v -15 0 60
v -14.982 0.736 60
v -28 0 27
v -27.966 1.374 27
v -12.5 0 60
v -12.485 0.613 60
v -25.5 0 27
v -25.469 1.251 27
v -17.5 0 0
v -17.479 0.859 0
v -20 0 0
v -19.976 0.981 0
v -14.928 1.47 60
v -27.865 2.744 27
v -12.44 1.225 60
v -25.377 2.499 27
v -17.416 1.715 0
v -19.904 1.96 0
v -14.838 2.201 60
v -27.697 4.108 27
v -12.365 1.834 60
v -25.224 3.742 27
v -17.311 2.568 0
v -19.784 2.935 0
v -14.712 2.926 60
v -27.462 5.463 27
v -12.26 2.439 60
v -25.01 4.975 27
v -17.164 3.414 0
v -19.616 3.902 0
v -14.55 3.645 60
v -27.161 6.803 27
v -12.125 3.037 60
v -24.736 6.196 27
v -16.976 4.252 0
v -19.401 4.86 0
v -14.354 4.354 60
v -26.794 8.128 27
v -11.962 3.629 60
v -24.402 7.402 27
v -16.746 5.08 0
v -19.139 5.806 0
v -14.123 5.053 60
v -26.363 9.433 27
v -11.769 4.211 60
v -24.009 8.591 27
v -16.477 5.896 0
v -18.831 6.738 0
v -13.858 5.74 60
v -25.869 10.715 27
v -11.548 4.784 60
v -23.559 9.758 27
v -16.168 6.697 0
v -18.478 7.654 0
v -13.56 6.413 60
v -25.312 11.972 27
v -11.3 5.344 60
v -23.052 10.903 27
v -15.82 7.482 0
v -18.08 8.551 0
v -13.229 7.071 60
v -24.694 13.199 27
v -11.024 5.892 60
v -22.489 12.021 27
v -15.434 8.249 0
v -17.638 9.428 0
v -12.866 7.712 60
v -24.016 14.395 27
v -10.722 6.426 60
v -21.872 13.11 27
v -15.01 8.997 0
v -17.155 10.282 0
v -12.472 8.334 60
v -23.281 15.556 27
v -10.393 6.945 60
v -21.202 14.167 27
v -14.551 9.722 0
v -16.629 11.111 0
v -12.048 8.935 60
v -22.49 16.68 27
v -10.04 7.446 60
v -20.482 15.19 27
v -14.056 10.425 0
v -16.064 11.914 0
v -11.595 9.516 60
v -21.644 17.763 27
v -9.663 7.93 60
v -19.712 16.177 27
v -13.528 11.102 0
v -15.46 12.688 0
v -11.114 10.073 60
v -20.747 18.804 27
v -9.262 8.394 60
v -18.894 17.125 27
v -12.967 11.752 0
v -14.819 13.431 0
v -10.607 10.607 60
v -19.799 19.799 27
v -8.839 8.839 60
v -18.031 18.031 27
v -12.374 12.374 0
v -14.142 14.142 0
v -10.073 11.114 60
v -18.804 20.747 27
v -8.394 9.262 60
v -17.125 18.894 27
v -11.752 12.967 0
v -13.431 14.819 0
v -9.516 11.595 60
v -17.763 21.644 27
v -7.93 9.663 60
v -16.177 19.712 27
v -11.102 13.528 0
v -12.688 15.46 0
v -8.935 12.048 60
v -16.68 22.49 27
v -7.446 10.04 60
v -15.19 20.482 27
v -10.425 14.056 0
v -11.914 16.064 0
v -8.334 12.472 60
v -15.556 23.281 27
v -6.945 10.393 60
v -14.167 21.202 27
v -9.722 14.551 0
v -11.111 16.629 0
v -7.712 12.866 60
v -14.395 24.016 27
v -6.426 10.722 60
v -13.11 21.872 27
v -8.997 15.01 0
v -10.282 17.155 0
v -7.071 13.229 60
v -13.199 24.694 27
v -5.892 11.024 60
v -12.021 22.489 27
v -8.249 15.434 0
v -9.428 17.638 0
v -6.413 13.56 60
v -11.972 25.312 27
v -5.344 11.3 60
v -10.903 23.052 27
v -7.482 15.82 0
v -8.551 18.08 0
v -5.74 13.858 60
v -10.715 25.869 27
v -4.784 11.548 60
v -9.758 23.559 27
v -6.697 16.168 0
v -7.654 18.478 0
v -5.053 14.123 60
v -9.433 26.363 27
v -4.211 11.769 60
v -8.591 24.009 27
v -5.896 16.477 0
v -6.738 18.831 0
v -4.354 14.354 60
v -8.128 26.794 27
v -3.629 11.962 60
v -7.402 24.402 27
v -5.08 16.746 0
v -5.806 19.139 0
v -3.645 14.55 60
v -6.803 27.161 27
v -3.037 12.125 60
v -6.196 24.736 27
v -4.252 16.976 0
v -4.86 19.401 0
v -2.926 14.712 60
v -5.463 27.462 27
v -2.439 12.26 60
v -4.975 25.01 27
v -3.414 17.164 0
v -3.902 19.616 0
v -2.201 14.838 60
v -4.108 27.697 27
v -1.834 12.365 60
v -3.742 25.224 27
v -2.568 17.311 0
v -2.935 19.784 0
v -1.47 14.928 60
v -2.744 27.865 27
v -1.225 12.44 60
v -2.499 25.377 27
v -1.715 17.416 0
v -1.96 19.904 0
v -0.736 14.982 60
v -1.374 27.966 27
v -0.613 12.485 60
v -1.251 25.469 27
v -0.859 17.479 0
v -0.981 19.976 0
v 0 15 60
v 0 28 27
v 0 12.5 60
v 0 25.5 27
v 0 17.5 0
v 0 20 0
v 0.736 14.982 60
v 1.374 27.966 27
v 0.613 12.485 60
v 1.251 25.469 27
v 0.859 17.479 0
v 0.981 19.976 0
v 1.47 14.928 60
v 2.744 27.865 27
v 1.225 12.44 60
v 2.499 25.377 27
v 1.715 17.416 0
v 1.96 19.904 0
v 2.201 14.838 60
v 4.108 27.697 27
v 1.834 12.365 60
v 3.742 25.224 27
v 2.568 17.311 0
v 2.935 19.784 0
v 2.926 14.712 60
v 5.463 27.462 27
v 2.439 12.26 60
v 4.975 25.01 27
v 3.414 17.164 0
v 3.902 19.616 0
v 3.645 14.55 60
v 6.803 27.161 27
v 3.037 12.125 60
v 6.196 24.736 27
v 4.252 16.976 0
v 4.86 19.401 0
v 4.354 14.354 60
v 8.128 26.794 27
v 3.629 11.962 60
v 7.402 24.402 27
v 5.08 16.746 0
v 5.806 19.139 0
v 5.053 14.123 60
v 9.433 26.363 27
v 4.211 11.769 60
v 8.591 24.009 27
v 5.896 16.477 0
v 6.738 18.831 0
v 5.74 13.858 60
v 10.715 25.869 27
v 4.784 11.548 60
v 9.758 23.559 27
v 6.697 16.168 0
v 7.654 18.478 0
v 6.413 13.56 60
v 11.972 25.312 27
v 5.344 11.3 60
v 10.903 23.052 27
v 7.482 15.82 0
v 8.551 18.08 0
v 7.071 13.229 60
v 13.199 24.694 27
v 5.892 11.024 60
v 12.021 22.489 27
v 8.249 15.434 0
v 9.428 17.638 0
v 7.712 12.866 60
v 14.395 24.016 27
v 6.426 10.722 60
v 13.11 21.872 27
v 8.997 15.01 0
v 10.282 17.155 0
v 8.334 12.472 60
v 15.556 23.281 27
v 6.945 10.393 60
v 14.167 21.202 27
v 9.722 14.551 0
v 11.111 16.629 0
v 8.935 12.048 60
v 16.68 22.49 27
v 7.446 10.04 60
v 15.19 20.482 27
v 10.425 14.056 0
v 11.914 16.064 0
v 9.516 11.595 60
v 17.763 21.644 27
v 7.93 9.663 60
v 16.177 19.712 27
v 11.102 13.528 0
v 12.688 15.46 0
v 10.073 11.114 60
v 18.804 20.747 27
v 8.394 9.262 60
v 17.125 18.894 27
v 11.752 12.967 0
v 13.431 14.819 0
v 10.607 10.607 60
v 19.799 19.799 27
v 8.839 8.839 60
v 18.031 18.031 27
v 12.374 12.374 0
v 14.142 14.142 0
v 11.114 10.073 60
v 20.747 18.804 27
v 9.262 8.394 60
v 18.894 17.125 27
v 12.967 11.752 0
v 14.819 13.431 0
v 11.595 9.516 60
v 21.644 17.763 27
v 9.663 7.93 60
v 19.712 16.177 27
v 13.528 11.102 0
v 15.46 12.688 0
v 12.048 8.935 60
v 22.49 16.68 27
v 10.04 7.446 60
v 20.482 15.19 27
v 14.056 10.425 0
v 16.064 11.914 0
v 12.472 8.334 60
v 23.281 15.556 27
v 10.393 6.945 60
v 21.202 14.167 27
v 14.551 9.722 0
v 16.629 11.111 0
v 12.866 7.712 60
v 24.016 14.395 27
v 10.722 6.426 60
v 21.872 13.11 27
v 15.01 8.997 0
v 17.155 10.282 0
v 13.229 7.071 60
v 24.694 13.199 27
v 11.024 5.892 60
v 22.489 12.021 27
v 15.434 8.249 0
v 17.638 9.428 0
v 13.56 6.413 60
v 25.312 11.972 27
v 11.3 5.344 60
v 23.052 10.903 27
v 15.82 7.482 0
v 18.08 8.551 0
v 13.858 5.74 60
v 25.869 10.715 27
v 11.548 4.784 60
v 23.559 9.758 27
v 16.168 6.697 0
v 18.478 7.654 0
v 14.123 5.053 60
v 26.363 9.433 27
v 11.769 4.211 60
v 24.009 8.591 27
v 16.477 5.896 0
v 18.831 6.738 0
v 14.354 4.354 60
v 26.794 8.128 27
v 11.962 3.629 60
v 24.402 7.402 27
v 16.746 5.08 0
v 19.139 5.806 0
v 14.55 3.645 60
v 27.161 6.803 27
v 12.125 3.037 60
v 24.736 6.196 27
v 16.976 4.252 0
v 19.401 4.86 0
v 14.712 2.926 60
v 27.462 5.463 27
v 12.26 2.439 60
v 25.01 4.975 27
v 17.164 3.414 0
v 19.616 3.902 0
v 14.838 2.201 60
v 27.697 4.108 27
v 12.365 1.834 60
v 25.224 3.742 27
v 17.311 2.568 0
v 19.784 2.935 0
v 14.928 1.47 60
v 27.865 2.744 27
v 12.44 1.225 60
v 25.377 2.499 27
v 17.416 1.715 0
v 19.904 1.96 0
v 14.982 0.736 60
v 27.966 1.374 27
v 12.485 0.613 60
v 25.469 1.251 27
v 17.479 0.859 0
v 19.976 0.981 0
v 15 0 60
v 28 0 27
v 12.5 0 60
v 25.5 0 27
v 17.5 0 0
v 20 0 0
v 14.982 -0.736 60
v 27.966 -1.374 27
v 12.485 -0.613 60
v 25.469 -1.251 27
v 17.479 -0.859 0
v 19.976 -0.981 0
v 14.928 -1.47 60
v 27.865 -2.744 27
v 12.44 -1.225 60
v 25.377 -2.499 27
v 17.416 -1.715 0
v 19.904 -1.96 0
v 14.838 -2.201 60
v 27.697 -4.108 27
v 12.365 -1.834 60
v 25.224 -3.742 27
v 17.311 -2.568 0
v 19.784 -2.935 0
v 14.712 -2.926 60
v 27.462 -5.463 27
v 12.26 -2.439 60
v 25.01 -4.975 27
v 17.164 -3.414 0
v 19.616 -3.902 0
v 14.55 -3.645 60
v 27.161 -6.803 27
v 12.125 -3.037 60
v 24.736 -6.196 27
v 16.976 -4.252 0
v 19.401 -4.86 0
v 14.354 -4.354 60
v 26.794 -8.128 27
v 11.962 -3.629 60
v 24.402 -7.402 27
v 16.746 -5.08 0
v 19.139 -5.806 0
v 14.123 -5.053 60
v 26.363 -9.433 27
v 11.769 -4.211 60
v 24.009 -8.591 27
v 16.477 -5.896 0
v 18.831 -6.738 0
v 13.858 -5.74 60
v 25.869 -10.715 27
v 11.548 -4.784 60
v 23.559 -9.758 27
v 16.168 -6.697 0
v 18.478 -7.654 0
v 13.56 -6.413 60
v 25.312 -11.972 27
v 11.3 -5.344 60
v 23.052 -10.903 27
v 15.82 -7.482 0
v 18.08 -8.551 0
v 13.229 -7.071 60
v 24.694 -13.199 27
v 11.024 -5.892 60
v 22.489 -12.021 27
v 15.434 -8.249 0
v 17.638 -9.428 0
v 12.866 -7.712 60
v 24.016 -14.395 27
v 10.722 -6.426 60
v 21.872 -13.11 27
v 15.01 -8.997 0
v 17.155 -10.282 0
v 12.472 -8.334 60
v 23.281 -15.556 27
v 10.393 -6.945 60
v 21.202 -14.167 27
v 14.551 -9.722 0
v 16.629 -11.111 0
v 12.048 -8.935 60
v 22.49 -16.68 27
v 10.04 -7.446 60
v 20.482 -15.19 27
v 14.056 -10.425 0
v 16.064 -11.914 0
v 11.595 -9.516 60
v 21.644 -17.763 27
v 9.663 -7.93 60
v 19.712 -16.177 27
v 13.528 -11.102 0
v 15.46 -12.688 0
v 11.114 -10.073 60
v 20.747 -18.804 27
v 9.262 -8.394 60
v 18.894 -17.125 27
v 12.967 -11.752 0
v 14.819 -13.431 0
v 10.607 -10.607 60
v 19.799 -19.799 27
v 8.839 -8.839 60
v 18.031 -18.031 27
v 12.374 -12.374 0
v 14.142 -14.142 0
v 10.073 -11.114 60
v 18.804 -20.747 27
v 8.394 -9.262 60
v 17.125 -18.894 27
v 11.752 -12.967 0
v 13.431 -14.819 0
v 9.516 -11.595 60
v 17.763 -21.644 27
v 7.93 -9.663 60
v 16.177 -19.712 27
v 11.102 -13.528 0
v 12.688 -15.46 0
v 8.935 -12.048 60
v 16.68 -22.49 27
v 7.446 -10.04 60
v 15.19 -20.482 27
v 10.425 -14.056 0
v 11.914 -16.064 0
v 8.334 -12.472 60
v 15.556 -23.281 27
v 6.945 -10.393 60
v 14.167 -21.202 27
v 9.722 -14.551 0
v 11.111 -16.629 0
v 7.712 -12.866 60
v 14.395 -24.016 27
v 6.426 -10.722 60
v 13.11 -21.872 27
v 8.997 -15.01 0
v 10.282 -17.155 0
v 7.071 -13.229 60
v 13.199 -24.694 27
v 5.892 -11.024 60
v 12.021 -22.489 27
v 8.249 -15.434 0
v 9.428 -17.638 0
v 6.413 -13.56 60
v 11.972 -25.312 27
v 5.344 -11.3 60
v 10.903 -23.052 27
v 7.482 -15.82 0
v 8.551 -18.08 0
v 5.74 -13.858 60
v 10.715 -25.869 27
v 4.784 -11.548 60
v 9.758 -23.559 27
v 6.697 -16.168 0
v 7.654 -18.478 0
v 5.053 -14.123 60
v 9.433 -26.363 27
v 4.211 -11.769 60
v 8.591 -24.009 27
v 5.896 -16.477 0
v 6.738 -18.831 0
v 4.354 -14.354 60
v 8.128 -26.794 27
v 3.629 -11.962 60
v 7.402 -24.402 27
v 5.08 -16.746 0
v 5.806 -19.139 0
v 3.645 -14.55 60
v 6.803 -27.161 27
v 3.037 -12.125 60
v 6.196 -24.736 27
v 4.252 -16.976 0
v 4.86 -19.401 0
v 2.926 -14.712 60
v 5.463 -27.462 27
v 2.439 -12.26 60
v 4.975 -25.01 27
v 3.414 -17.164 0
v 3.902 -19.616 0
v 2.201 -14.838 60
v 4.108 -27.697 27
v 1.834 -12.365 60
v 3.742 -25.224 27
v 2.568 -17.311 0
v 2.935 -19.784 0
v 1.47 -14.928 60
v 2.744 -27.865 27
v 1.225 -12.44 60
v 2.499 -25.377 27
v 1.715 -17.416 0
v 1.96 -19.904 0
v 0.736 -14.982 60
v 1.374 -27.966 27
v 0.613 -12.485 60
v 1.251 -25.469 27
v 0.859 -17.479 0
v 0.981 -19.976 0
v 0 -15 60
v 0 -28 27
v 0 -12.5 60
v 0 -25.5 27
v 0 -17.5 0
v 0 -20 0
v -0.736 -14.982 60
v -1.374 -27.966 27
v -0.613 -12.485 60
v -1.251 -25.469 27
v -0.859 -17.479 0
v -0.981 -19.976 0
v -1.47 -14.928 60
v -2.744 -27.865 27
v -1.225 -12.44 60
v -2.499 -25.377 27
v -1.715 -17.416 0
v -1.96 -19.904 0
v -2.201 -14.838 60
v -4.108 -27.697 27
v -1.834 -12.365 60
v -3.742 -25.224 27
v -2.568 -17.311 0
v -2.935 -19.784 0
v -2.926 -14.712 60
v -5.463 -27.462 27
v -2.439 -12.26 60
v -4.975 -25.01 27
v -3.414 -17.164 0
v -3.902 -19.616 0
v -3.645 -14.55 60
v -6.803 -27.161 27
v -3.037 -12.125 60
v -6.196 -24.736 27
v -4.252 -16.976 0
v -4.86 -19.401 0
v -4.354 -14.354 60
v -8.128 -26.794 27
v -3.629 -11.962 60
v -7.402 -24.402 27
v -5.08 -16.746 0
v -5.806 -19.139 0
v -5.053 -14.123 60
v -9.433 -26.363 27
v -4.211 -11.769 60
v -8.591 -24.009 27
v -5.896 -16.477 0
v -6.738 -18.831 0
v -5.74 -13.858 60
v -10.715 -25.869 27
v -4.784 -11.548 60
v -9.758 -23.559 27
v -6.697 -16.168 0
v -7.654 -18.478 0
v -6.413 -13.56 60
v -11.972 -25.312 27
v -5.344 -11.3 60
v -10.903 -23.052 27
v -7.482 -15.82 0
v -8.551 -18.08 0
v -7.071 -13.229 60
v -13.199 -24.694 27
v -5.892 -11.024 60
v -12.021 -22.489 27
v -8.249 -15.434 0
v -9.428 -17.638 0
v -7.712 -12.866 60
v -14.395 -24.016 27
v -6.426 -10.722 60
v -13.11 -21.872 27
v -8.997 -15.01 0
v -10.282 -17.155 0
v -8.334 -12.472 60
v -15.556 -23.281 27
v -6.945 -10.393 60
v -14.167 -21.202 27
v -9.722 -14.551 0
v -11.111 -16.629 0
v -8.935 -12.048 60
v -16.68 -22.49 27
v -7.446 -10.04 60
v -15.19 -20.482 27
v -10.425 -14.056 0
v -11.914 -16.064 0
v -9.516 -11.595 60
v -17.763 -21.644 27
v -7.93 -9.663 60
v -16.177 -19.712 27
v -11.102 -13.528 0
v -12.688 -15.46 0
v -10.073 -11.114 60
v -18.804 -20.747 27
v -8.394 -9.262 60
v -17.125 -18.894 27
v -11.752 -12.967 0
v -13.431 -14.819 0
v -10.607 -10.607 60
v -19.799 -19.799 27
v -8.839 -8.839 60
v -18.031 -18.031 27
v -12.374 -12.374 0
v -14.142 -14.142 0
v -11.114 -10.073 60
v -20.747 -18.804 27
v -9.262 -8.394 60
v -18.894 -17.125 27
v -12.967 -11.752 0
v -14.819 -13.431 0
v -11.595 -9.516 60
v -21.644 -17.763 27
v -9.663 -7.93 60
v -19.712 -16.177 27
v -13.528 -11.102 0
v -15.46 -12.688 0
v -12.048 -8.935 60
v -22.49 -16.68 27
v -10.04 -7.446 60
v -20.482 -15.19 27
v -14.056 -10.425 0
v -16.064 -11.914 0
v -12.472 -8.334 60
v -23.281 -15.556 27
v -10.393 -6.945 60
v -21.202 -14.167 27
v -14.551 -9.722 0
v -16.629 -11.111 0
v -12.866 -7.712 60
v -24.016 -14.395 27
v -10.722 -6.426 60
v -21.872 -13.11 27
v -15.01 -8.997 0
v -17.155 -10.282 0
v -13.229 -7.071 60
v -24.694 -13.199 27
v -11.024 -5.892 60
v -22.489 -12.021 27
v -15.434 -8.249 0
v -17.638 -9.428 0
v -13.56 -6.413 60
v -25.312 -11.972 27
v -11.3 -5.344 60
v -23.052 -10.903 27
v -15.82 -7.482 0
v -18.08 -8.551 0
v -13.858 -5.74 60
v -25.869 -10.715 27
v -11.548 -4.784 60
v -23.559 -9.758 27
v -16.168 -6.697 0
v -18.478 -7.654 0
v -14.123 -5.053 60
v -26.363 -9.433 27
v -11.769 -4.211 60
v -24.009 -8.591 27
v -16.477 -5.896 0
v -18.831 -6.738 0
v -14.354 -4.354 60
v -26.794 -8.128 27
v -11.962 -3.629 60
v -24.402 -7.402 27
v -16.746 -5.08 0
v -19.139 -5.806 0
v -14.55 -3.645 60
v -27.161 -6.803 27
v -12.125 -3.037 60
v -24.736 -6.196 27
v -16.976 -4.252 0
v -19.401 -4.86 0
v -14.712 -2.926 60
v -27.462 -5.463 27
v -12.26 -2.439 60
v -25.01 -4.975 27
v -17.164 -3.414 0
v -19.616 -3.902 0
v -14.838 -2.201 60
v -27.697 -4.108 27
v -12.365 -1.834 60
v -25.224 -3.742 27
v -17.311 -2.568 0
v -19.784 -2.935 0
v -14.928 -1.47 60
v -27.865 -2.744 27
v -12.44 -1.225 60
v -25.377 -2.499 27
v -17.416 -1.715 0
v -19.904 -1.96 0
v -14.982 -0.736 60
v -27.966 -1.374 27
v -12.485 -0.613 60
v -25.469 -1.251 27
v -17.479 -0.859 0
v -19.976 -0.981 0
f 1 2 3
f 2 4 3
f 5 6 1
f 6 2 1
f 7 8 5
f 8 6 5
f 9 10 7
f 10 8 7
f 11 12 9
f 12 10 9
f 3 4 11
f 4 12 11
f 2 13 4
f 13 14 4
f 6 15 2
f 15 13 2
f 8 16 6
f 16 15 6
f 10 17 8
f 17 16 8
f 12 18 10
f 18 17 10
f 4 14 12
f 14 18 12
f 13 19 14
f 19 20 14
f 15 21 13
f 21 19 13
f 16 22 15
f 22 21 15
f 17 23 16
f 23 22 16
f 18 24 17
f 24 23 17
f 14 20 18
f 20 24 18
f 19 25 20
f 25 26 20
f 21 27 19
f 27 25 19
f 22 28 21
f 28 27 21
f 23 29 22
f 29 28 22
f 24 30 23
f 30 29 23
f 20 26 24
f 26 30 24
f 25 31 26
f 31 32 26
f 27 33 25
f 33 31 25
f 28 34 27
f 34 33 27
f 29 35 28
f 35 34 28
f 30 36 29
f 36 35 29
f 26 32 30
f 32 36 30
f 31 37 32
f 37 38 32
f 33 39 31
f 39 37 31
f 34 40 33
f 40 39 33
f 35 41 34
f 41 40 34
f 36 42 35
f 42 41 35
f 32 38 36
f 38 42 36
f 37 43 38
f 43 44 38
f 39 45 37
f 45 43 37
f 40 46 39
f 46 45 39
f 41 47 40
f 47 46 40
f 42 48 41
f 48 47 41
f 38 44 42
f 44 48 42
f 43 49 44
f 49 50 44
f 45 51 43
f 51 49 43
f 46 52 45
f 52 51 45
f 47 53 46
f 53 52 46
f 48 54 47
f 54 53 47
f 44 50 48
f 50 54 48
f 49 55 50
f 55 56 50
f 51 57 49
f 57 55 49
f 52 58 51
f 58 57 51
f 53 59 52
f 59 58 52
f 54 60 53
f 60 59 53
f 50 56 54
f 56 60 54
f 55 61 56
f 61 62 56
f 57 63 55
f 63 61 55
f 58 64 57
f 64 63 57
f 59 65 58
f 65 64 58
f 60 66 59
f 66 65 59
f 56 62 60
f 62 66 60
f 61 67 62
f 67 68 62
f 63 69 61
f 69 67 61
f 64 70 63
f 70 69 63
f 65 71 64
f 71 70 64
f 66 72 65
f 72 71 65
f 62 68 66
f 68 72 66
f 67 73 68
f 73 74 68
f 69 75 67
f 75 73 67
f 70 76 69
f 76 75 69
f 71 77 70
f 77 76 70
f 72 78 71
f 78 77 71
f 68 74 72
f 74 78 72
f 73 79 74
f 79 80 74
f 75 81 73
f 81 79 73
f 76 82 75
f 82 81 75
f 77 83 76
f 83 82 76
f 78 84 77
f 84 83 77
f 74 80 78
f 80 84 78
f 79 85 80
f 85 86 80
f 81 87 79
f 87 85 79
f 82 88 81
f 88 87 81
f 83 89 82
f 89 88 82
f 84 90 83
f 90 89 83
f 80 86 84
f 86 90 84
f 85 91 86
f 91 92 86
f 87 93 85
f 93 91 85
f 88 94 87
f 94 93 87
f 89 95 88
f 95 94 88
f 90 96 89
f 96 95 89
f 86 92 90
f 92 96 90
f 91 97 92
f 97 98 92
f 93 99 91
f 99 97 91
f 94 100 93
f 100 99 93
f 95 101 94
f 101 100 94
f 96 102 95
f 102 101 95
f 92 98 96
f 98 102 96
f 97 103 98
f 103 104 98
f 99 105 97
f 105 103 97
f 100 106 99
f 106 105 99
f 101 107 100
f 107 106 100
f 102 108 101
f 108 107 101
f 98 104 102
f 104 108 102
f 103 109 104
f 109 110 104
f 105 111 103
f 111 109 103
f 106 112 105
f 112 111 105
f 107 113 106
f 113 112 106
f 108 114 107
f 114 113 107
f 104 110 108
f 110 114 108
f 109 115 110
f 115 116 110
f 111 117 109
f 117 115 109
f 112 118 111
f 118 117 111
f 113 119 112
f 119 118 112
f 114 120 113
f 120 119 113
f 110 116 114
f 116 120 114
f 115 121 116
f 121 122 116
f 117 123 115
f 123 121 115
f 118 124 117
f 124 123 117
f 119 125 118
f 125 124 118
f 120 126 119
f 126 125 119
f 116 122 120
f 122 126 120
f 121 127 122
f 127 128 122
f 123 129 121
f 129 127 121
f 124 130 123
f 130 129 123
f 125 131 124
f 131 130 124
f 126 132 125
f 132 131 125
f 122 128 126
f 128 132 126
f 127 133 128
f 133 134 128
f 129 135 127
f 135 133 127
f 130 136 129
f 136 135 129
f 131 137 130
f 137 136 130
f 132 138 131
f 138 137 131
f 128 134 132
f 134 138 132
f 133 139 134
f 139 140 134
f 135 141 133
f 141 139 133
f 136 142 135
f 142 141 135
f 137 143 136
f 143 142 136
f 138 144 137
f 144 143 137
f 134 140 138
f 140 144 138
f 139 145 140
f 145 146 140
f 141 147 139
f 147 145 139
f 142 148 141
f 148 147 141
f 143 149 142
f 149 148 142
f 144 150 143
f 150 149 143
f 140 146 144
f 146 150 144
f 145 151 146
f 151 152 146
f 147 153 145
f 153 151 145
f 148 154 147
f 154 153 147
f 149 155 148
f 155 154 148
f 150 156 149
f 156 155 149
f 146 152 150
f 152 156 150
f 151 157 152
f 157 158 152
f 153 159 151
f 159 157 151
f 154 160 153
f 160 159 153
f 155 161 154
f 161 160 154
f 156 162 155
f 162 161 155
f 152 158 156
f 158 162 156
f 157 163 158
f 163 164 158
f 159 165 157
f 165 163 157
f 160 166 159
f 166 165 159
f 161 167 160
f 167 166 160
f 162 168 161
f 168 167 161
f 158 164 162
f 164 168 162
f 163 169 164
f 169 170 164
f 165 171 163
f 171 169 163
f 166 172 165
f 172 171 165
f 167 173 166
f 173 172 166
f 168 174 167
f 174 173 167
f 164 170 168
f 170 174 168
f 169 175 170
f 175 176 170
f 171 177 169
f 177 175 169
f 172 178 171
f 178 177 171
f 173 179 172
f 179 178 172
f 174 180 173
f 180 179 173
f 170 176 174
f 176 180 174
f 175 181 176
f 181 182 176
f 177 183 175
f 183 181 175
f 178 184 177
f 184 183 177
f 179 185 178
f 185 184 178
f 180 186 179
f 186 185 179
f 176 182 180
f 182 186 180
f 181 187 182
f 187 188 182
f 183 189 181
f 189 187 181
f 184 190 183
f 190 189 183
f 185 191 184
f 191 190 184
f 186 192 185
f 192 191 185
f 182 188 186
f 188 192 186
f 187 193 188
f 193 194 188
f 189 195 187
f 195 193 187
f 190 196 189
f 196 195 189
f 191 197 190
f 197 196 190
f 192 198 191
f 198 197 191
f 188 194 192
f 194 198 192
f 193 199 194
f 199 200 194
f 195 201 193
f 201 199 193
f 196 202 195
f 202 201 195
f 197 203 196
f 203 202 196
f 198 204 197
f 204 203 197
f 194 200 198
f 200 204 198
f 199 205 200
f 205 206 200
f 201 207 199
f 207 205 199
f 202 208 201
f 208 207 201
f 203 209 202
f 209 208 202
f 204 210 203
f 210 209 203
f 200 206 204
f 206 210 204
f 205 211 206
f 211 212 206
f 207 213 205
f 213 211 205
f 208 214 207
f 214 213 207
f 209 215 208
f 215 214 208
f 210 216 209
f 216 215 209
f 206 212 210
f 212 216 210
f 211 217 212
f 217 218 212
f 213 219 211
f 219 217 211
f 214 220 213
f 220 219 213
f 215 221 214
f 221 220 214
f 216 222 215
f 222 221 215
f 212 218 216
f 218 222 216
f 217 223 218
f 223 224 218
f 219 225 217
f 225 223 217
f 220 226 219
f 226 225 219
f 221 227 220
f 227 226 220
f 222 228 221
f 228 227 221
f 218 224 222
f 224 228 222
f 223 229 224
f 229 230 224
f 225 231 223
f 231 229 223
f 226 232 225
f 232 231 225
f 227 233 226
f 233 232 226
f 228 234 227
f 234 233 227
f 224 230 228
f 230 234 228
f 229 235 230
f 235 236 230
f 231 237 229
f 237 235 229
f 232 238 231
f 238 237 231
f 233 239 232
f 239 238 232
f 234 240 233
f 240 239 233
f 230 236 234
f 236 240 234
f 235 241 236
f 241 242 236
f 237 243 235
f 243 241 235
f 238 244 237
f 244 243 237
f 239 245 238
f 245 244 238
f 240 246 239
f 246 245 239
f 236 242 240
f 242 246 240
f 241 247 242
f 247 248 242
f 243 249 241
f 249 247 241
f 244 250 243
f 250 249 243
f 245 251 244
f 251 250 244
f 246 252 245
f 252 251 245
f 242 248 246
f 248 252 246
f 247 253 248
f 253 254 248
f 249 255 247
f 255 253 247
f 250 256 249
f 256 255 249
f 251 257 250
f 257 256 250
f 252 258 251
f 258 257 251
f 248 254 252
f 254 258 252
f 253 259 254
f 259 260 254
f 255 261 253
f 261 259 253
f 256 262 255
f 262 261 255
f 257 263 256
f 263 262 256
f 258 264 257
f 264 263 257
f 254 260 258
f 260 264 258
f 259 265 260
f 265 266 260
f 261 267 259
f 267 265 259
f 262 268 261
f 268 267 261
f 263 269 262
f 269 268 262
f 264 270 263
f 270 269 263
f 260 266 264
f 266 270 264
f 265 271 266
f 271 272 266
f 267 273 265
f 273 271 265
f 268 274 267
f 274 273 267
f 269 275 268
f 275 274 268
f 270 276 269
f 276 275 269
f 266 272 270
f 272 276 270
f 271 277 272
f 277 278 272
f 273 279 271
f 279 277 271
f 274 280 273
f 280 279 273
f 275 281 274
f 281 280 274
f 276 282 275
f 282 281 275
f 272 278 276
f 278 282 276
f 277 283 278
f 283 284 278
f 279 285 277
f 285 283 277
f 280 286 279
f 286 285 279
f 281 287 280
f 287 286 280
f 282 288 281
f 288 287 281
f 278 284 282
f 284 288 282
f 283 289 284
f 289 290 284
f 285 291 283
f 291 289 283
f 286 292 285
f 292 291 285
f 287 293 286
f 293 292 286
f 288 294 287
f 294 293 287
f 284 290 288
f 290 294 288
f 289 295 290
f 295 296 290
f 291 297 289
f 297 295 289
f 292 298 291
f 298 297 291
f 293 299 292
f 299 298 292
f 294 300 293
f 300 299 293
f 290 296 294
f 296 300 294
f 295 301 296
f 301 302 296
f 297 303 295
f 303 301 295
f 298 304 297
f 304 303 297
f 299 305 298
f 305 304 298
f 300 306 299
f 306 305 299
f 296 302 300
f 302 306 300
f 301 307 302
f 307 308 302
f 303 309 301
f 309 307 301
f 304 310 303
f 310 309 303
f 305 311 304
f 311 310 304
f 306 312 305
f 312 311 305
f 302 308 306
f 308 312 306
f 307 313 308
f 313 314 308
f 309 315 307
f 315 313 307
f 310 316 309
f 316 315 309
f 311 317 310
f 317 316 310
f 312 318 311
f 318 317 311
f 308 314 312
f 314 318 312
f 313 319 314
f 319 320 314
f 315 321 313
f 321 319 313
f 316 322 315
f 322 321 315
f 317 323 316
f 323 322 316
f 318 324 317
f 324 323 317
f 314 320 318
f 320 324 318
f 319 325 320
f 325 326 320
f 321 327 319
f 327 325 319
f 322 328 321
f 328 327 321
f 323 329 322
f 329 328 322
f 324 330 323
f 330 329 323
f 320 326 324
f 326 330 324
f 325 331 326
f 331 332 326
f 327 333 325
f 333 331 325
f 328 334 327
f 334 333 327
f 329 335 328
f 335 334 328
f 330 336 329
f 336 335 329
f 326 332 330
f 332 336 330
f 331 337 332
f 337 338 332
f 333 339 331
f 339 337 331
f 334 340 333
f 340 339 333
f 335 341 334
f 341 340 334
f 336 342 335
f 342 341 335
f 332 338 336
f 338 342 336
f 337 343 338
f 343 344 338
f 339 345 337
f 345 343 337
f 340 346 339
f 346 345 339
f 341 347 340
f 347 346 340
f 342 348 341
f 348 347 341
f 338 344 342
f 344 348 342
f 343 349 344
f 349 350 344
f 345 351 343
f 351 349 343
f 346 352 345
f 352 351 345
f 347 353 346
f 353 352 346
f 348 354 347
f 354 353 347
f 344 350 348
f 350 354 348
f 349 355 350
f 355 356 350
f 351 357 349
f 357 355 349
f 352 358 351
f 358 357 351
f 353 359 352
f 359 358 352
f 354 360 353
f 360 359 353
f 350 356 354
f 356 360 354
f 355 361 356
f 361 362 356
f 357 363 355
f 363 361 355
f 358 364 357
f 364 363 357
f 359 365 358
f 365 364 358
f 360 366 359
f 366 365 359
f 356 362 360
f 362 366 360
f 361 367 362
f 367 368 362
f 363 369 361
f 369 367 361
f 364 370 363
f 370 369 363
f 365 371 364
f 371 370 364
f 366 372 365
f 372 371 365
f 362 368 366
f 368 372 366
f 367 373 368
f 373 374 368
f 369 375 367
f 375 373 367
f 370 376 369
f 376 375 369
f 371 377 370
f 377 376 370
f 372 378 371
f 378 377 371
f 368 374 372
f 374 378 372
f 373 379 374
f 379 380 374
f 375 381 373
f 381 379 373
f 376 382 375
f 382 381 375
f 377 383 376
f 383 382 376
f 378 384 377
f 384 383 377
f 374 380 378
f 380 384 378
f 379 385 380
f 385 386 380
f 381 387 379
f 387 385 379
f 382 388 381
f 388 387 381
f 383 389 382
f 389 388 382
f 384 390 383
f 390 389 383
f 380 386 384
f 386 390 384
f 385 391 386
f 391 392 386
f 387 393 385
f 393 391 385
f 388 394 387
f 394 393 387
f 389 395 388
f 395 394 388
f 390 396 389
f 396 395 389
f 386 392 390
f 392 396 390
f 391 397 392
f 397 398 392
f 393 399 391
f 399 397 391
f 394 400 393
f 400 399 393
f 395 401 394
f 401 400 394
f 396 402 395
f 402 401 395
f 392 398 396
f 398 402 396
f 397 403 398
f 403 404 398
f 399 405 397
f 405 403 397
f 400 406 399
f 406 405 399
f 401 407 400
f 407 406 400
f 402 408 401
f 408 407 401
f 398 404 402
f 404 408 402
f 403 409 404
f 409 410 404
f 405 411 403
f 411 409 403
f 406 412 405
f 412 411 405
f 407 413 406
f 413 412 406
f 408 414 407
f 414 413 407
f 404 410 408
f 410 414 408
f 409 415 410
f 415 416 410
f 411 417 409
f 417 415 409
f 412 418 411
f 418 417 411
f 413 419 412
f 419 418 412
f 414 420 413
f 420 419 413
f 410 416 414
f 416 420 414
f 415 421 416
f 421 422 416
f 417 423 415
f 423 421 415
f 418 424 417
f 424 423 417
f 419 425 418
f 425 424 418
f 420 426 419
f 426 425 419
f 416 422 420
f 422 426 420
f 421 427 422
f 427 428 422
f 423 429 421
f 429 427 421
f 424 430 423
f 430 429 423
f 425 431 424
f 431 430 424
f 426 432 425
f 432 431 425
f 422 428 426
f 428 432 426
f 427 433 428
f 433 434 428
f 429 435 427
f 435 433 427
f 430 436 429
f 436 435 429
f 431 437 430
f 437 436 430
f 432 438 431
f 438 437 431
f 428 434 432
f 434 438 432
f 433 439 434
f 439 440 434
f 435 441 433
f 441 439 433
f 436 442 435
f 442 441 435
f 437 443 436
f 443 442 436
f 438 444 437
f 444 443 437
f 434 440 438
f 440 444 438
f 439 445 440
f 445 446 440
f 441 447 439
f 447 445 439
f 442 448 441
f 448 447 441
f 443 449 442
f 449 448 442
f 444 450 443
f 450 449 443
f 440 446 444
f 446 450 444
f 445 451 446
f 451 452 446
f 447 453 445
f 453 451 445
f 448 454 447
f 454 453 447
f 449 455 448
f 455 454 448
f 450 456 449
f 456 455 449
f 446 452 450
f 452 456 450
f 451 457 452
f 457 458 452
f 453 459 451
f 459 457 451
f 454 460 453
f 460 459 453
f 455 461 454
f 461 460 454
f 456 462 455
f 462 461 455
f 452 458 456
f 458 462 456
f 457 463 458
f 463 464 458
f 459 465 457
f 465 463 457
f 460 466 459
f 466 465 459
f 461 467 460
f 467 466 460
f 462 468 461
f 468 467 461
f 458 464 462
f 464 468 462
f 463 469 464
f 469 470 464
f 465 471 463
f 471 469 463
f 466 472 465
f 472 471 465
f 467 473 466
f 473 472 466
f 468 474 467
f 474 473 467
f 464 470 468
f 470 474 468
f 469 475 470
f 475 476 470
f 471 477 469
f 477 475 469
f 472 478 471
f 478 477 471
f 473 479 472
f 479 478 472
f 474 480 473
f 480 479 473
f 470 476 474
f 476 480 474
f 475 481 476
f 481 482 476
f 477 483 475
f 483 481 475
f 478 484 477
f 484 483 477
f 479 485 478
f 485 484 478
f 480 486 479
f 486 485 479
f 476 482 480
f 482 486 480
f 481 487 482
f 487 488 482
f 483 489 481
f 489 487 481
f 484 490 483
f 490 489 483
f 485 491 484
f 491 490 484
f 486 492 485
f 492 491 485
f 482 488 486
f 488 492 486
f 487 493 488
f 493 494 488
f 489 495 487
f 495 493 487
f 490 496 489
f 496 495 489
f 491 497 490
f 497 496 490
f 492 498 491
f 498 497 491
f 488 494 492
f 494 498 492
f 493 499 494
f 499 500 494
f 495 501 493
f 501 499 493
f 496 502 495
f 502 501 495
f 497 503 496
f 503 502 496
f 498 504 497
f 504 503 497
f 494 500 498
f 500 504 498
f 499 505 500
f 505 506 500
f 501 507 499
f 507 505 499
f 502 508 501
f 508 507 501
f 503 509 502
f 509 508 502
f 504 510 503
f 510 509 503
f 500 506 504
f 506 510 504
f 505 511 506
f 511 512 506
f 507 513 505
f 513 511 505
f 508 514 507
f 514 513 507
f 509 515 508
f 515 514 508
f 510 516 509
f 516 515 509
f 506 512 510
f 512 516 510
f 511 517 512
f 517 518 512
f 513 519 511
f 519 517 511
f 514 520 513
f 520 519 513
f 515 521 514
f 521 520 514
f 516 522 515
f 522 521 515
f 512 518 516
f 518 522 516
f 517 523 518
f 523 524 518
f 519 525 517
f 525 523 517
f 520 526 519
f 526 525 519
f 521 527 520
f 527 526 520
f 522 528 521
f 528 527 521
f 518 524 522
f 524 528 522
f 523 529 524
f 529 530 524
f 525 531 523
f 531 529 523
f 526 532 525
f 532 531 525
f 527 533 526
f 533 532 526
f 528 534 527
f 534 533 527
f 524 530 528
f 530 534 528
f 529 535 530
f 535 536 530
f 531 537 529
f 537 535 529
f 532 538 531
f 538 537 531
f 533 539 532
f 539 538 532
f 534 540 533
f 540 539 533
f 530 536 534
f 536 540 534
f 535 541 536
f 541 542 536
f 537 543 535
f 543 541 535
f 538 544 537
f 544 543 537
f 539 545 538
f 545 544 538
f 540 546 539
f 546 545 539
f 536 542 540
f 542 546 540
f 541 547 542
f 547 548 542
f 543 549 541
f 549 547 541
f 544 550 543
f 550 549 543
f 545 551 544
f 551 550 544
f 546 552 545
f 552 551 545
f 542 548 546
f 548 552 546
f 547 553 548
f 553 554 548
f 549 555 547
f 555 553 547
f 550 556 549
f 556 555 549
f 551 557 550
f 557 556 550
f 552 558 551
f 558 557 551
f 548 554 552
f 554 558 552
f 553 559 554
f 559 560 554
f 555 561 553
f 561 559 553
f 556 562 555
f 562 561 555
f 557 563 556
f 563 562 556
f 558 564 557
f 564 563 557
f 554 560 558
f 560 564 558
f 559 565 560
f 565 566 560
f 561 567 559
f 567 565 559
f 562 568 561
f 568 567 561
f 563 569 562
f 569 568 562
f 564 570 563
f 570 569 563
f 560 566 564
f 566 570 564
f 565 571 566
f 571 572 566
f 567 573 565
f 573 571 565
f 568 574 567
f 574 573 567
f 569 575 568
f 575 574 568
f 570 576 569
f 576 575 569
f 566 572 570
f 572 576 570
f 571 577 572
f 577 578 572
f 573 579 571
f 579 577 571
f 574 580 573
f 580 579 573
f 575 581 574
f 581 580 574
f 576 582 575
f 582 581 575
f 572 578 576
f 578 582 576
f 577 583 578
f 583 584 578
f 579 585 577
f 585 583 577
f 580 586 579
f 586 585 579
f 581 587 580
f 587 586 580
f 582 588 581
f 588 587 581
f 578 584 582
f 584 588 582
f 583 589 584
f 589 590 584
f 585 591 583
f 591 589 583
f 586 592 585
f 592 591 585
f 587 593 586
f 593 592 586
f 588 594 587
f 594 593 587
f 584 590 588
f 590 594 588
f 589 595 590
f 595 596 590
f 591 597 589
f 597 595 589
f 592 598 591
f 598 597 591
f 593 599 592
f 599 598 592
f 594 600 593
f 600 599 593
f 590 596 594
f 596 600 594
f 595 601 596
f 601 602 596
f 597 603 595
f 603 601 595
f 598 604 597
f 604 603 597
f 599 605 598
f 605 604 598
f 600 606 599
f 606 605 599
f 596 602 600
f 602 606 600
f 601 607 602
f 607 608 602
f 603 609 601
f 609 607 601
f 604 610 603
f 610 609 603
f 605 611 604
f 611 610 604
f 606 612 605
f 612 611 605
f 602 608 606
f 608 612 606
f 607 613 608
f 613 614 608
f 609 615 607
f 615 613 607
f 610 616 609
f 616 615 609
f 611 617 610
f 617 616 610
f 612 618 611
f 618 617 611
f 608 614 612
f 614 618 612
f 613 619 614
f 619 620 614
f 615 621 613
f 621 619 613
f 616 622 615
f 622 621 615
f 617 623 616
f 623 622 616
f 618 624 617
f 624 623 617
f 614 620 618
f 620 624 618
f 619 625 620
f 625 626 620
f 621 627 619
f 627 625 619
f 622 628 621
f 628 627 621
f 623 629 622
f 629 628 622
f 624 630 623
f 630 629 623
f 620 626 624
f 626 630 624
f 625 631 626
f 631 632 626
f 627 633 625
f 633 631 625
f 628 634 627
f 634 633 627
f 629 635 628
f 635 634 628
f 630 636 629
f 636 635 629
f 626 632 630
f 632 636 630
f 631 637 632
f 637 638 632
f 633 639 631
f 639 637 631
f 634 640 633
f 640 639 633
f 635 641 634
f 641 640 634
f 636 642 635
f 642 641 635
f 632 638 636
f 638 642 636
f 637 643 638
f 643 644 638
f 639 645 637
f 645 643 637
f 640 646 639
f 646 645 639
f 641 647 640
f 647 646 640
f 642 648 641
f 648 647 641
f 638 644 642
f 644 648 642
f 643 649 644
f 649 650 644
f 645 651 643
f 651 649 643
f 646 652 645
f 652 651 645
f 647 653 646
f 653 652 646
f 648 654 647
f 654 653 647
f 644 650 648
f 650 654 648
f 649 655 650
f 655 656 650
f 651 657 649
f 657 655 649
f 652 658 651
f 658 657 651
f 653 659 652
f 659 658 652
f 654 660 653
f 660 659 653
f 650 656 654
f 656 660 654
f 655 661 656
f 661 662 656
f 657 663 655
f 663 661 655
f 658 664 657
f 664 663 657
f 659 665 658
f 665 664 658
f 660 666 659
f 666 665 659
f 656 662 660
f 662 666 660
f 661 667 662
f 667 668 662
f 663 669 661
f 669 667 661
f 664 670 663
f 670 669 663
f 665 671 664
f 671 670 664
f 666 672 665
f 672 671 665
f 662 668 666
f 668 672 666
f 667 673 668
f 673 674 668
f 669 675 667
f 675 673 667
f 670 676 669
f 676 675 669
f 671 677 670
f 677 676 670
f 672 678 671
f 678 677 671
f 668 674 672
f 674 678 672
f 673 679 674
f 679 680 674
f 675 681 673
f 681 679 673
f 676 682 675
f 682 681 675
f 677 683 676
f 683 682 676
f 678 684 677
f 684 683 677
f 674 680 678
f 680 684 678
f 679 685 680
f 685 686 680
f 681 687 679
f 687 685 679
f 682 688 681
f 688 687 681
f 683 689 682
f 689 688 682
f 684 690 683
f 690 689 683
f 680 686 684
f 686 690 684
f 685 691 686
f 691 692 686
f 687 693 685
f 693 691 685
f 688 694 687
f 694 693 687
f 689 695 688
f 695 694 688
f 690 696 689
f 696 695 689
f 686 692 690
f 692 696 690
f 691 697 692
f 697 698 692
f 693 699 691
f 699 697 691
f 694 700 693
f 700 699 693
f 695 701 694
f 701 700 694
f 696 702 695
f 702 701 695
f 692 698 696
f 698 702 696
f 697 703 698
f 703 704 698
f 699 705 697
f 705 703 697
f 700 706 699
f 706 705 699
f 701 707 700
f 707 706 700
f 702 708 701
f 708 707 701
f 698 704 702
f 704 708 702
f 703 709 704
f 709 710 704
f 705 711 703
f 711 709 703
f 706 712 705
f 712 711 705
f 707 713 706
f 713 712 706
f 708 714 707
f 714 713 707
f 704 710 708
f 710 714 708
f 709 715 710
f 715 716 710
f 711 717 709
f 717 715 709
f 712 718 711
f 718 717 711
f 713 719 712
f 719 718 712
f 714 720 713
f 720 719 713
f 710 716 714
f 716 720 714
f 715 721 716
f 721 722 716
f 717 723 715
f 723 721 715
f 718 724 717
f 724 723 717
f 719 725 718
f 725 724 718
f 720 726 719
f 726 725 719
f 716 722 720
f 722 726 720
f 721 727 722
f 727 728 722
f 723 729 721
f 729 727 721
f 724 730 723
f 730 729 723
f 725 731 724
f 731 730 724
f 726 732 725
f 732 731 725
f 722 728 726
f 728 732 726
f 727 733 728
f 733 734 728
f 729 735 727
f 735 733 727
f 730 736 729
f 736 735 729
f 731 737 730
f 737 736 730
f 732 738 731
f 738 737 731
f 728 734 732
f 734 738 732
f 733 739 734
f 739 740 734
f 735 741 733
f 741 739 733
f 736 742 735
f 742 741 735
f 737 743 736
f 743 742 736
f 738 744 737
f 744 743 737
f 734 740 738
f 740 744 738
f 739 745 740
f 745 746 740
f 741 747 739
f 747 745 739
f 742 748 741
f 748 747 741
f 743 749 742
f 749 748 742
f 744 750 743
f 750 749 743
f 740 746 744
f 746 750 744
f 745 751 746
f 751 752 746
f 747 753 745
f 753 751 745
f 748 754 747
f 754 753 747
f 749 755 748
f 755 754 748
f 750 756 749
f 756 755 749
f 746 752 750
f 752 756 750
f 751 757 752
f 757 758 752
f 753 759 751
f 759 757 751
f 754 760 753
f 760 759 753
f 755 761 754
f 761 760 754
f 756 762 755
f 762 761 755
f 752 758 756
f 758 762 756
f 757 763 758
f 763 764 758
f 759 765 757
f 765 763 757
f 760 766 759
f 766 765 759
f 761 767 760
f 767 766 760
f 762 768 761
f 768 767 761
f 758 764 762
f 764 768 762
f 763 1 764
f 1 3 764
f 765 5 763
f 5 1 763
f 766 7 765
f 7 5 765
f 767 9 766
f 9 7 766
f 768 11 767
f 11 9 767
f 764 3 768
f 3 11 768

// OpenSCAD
// Rotational Sweep Vase
// Uses rotate_extrude on a 2-D profile defined by polygon.
// Parameters:
//   base_r   — base radius (mm)
//   top_r    — top rim radius (mm)
//   height   — overall vase height (mm)
//   wall     — wall thickness (mm)
//   bulge    — mid-body outward bulge (mm)

base_r = 20;
top_r  = 15;
height = 60;
wall   = 2.5;
bulge  = 8;

// 2-D cross-section profile (quarter view, will be revolved 360°)
// Points go bottom-to-top along outer wall, then top-to-bottom along inner wall.
module vase_profile(br, tr, h, w, bg) {
    mid_r_outer = max(br, tr) + bg;   // widest point
    mid_h = h * 0.45;                 // height of widest point

    polygon(points=[
        // Outer wall — bottom to top
        [br,     0],
        [mid_r_outer, mid_h],
        [tr,     h],
        // Inner wall — top to bottom
        [tr - w, h],
        [mid_r_outer - w, mid_h],
        [br - w, 0],
    ]);
}

rotate_extrude(angle=360, $fn=128)
    vase_profile(base_r, top_r, height, wall, bulge);
